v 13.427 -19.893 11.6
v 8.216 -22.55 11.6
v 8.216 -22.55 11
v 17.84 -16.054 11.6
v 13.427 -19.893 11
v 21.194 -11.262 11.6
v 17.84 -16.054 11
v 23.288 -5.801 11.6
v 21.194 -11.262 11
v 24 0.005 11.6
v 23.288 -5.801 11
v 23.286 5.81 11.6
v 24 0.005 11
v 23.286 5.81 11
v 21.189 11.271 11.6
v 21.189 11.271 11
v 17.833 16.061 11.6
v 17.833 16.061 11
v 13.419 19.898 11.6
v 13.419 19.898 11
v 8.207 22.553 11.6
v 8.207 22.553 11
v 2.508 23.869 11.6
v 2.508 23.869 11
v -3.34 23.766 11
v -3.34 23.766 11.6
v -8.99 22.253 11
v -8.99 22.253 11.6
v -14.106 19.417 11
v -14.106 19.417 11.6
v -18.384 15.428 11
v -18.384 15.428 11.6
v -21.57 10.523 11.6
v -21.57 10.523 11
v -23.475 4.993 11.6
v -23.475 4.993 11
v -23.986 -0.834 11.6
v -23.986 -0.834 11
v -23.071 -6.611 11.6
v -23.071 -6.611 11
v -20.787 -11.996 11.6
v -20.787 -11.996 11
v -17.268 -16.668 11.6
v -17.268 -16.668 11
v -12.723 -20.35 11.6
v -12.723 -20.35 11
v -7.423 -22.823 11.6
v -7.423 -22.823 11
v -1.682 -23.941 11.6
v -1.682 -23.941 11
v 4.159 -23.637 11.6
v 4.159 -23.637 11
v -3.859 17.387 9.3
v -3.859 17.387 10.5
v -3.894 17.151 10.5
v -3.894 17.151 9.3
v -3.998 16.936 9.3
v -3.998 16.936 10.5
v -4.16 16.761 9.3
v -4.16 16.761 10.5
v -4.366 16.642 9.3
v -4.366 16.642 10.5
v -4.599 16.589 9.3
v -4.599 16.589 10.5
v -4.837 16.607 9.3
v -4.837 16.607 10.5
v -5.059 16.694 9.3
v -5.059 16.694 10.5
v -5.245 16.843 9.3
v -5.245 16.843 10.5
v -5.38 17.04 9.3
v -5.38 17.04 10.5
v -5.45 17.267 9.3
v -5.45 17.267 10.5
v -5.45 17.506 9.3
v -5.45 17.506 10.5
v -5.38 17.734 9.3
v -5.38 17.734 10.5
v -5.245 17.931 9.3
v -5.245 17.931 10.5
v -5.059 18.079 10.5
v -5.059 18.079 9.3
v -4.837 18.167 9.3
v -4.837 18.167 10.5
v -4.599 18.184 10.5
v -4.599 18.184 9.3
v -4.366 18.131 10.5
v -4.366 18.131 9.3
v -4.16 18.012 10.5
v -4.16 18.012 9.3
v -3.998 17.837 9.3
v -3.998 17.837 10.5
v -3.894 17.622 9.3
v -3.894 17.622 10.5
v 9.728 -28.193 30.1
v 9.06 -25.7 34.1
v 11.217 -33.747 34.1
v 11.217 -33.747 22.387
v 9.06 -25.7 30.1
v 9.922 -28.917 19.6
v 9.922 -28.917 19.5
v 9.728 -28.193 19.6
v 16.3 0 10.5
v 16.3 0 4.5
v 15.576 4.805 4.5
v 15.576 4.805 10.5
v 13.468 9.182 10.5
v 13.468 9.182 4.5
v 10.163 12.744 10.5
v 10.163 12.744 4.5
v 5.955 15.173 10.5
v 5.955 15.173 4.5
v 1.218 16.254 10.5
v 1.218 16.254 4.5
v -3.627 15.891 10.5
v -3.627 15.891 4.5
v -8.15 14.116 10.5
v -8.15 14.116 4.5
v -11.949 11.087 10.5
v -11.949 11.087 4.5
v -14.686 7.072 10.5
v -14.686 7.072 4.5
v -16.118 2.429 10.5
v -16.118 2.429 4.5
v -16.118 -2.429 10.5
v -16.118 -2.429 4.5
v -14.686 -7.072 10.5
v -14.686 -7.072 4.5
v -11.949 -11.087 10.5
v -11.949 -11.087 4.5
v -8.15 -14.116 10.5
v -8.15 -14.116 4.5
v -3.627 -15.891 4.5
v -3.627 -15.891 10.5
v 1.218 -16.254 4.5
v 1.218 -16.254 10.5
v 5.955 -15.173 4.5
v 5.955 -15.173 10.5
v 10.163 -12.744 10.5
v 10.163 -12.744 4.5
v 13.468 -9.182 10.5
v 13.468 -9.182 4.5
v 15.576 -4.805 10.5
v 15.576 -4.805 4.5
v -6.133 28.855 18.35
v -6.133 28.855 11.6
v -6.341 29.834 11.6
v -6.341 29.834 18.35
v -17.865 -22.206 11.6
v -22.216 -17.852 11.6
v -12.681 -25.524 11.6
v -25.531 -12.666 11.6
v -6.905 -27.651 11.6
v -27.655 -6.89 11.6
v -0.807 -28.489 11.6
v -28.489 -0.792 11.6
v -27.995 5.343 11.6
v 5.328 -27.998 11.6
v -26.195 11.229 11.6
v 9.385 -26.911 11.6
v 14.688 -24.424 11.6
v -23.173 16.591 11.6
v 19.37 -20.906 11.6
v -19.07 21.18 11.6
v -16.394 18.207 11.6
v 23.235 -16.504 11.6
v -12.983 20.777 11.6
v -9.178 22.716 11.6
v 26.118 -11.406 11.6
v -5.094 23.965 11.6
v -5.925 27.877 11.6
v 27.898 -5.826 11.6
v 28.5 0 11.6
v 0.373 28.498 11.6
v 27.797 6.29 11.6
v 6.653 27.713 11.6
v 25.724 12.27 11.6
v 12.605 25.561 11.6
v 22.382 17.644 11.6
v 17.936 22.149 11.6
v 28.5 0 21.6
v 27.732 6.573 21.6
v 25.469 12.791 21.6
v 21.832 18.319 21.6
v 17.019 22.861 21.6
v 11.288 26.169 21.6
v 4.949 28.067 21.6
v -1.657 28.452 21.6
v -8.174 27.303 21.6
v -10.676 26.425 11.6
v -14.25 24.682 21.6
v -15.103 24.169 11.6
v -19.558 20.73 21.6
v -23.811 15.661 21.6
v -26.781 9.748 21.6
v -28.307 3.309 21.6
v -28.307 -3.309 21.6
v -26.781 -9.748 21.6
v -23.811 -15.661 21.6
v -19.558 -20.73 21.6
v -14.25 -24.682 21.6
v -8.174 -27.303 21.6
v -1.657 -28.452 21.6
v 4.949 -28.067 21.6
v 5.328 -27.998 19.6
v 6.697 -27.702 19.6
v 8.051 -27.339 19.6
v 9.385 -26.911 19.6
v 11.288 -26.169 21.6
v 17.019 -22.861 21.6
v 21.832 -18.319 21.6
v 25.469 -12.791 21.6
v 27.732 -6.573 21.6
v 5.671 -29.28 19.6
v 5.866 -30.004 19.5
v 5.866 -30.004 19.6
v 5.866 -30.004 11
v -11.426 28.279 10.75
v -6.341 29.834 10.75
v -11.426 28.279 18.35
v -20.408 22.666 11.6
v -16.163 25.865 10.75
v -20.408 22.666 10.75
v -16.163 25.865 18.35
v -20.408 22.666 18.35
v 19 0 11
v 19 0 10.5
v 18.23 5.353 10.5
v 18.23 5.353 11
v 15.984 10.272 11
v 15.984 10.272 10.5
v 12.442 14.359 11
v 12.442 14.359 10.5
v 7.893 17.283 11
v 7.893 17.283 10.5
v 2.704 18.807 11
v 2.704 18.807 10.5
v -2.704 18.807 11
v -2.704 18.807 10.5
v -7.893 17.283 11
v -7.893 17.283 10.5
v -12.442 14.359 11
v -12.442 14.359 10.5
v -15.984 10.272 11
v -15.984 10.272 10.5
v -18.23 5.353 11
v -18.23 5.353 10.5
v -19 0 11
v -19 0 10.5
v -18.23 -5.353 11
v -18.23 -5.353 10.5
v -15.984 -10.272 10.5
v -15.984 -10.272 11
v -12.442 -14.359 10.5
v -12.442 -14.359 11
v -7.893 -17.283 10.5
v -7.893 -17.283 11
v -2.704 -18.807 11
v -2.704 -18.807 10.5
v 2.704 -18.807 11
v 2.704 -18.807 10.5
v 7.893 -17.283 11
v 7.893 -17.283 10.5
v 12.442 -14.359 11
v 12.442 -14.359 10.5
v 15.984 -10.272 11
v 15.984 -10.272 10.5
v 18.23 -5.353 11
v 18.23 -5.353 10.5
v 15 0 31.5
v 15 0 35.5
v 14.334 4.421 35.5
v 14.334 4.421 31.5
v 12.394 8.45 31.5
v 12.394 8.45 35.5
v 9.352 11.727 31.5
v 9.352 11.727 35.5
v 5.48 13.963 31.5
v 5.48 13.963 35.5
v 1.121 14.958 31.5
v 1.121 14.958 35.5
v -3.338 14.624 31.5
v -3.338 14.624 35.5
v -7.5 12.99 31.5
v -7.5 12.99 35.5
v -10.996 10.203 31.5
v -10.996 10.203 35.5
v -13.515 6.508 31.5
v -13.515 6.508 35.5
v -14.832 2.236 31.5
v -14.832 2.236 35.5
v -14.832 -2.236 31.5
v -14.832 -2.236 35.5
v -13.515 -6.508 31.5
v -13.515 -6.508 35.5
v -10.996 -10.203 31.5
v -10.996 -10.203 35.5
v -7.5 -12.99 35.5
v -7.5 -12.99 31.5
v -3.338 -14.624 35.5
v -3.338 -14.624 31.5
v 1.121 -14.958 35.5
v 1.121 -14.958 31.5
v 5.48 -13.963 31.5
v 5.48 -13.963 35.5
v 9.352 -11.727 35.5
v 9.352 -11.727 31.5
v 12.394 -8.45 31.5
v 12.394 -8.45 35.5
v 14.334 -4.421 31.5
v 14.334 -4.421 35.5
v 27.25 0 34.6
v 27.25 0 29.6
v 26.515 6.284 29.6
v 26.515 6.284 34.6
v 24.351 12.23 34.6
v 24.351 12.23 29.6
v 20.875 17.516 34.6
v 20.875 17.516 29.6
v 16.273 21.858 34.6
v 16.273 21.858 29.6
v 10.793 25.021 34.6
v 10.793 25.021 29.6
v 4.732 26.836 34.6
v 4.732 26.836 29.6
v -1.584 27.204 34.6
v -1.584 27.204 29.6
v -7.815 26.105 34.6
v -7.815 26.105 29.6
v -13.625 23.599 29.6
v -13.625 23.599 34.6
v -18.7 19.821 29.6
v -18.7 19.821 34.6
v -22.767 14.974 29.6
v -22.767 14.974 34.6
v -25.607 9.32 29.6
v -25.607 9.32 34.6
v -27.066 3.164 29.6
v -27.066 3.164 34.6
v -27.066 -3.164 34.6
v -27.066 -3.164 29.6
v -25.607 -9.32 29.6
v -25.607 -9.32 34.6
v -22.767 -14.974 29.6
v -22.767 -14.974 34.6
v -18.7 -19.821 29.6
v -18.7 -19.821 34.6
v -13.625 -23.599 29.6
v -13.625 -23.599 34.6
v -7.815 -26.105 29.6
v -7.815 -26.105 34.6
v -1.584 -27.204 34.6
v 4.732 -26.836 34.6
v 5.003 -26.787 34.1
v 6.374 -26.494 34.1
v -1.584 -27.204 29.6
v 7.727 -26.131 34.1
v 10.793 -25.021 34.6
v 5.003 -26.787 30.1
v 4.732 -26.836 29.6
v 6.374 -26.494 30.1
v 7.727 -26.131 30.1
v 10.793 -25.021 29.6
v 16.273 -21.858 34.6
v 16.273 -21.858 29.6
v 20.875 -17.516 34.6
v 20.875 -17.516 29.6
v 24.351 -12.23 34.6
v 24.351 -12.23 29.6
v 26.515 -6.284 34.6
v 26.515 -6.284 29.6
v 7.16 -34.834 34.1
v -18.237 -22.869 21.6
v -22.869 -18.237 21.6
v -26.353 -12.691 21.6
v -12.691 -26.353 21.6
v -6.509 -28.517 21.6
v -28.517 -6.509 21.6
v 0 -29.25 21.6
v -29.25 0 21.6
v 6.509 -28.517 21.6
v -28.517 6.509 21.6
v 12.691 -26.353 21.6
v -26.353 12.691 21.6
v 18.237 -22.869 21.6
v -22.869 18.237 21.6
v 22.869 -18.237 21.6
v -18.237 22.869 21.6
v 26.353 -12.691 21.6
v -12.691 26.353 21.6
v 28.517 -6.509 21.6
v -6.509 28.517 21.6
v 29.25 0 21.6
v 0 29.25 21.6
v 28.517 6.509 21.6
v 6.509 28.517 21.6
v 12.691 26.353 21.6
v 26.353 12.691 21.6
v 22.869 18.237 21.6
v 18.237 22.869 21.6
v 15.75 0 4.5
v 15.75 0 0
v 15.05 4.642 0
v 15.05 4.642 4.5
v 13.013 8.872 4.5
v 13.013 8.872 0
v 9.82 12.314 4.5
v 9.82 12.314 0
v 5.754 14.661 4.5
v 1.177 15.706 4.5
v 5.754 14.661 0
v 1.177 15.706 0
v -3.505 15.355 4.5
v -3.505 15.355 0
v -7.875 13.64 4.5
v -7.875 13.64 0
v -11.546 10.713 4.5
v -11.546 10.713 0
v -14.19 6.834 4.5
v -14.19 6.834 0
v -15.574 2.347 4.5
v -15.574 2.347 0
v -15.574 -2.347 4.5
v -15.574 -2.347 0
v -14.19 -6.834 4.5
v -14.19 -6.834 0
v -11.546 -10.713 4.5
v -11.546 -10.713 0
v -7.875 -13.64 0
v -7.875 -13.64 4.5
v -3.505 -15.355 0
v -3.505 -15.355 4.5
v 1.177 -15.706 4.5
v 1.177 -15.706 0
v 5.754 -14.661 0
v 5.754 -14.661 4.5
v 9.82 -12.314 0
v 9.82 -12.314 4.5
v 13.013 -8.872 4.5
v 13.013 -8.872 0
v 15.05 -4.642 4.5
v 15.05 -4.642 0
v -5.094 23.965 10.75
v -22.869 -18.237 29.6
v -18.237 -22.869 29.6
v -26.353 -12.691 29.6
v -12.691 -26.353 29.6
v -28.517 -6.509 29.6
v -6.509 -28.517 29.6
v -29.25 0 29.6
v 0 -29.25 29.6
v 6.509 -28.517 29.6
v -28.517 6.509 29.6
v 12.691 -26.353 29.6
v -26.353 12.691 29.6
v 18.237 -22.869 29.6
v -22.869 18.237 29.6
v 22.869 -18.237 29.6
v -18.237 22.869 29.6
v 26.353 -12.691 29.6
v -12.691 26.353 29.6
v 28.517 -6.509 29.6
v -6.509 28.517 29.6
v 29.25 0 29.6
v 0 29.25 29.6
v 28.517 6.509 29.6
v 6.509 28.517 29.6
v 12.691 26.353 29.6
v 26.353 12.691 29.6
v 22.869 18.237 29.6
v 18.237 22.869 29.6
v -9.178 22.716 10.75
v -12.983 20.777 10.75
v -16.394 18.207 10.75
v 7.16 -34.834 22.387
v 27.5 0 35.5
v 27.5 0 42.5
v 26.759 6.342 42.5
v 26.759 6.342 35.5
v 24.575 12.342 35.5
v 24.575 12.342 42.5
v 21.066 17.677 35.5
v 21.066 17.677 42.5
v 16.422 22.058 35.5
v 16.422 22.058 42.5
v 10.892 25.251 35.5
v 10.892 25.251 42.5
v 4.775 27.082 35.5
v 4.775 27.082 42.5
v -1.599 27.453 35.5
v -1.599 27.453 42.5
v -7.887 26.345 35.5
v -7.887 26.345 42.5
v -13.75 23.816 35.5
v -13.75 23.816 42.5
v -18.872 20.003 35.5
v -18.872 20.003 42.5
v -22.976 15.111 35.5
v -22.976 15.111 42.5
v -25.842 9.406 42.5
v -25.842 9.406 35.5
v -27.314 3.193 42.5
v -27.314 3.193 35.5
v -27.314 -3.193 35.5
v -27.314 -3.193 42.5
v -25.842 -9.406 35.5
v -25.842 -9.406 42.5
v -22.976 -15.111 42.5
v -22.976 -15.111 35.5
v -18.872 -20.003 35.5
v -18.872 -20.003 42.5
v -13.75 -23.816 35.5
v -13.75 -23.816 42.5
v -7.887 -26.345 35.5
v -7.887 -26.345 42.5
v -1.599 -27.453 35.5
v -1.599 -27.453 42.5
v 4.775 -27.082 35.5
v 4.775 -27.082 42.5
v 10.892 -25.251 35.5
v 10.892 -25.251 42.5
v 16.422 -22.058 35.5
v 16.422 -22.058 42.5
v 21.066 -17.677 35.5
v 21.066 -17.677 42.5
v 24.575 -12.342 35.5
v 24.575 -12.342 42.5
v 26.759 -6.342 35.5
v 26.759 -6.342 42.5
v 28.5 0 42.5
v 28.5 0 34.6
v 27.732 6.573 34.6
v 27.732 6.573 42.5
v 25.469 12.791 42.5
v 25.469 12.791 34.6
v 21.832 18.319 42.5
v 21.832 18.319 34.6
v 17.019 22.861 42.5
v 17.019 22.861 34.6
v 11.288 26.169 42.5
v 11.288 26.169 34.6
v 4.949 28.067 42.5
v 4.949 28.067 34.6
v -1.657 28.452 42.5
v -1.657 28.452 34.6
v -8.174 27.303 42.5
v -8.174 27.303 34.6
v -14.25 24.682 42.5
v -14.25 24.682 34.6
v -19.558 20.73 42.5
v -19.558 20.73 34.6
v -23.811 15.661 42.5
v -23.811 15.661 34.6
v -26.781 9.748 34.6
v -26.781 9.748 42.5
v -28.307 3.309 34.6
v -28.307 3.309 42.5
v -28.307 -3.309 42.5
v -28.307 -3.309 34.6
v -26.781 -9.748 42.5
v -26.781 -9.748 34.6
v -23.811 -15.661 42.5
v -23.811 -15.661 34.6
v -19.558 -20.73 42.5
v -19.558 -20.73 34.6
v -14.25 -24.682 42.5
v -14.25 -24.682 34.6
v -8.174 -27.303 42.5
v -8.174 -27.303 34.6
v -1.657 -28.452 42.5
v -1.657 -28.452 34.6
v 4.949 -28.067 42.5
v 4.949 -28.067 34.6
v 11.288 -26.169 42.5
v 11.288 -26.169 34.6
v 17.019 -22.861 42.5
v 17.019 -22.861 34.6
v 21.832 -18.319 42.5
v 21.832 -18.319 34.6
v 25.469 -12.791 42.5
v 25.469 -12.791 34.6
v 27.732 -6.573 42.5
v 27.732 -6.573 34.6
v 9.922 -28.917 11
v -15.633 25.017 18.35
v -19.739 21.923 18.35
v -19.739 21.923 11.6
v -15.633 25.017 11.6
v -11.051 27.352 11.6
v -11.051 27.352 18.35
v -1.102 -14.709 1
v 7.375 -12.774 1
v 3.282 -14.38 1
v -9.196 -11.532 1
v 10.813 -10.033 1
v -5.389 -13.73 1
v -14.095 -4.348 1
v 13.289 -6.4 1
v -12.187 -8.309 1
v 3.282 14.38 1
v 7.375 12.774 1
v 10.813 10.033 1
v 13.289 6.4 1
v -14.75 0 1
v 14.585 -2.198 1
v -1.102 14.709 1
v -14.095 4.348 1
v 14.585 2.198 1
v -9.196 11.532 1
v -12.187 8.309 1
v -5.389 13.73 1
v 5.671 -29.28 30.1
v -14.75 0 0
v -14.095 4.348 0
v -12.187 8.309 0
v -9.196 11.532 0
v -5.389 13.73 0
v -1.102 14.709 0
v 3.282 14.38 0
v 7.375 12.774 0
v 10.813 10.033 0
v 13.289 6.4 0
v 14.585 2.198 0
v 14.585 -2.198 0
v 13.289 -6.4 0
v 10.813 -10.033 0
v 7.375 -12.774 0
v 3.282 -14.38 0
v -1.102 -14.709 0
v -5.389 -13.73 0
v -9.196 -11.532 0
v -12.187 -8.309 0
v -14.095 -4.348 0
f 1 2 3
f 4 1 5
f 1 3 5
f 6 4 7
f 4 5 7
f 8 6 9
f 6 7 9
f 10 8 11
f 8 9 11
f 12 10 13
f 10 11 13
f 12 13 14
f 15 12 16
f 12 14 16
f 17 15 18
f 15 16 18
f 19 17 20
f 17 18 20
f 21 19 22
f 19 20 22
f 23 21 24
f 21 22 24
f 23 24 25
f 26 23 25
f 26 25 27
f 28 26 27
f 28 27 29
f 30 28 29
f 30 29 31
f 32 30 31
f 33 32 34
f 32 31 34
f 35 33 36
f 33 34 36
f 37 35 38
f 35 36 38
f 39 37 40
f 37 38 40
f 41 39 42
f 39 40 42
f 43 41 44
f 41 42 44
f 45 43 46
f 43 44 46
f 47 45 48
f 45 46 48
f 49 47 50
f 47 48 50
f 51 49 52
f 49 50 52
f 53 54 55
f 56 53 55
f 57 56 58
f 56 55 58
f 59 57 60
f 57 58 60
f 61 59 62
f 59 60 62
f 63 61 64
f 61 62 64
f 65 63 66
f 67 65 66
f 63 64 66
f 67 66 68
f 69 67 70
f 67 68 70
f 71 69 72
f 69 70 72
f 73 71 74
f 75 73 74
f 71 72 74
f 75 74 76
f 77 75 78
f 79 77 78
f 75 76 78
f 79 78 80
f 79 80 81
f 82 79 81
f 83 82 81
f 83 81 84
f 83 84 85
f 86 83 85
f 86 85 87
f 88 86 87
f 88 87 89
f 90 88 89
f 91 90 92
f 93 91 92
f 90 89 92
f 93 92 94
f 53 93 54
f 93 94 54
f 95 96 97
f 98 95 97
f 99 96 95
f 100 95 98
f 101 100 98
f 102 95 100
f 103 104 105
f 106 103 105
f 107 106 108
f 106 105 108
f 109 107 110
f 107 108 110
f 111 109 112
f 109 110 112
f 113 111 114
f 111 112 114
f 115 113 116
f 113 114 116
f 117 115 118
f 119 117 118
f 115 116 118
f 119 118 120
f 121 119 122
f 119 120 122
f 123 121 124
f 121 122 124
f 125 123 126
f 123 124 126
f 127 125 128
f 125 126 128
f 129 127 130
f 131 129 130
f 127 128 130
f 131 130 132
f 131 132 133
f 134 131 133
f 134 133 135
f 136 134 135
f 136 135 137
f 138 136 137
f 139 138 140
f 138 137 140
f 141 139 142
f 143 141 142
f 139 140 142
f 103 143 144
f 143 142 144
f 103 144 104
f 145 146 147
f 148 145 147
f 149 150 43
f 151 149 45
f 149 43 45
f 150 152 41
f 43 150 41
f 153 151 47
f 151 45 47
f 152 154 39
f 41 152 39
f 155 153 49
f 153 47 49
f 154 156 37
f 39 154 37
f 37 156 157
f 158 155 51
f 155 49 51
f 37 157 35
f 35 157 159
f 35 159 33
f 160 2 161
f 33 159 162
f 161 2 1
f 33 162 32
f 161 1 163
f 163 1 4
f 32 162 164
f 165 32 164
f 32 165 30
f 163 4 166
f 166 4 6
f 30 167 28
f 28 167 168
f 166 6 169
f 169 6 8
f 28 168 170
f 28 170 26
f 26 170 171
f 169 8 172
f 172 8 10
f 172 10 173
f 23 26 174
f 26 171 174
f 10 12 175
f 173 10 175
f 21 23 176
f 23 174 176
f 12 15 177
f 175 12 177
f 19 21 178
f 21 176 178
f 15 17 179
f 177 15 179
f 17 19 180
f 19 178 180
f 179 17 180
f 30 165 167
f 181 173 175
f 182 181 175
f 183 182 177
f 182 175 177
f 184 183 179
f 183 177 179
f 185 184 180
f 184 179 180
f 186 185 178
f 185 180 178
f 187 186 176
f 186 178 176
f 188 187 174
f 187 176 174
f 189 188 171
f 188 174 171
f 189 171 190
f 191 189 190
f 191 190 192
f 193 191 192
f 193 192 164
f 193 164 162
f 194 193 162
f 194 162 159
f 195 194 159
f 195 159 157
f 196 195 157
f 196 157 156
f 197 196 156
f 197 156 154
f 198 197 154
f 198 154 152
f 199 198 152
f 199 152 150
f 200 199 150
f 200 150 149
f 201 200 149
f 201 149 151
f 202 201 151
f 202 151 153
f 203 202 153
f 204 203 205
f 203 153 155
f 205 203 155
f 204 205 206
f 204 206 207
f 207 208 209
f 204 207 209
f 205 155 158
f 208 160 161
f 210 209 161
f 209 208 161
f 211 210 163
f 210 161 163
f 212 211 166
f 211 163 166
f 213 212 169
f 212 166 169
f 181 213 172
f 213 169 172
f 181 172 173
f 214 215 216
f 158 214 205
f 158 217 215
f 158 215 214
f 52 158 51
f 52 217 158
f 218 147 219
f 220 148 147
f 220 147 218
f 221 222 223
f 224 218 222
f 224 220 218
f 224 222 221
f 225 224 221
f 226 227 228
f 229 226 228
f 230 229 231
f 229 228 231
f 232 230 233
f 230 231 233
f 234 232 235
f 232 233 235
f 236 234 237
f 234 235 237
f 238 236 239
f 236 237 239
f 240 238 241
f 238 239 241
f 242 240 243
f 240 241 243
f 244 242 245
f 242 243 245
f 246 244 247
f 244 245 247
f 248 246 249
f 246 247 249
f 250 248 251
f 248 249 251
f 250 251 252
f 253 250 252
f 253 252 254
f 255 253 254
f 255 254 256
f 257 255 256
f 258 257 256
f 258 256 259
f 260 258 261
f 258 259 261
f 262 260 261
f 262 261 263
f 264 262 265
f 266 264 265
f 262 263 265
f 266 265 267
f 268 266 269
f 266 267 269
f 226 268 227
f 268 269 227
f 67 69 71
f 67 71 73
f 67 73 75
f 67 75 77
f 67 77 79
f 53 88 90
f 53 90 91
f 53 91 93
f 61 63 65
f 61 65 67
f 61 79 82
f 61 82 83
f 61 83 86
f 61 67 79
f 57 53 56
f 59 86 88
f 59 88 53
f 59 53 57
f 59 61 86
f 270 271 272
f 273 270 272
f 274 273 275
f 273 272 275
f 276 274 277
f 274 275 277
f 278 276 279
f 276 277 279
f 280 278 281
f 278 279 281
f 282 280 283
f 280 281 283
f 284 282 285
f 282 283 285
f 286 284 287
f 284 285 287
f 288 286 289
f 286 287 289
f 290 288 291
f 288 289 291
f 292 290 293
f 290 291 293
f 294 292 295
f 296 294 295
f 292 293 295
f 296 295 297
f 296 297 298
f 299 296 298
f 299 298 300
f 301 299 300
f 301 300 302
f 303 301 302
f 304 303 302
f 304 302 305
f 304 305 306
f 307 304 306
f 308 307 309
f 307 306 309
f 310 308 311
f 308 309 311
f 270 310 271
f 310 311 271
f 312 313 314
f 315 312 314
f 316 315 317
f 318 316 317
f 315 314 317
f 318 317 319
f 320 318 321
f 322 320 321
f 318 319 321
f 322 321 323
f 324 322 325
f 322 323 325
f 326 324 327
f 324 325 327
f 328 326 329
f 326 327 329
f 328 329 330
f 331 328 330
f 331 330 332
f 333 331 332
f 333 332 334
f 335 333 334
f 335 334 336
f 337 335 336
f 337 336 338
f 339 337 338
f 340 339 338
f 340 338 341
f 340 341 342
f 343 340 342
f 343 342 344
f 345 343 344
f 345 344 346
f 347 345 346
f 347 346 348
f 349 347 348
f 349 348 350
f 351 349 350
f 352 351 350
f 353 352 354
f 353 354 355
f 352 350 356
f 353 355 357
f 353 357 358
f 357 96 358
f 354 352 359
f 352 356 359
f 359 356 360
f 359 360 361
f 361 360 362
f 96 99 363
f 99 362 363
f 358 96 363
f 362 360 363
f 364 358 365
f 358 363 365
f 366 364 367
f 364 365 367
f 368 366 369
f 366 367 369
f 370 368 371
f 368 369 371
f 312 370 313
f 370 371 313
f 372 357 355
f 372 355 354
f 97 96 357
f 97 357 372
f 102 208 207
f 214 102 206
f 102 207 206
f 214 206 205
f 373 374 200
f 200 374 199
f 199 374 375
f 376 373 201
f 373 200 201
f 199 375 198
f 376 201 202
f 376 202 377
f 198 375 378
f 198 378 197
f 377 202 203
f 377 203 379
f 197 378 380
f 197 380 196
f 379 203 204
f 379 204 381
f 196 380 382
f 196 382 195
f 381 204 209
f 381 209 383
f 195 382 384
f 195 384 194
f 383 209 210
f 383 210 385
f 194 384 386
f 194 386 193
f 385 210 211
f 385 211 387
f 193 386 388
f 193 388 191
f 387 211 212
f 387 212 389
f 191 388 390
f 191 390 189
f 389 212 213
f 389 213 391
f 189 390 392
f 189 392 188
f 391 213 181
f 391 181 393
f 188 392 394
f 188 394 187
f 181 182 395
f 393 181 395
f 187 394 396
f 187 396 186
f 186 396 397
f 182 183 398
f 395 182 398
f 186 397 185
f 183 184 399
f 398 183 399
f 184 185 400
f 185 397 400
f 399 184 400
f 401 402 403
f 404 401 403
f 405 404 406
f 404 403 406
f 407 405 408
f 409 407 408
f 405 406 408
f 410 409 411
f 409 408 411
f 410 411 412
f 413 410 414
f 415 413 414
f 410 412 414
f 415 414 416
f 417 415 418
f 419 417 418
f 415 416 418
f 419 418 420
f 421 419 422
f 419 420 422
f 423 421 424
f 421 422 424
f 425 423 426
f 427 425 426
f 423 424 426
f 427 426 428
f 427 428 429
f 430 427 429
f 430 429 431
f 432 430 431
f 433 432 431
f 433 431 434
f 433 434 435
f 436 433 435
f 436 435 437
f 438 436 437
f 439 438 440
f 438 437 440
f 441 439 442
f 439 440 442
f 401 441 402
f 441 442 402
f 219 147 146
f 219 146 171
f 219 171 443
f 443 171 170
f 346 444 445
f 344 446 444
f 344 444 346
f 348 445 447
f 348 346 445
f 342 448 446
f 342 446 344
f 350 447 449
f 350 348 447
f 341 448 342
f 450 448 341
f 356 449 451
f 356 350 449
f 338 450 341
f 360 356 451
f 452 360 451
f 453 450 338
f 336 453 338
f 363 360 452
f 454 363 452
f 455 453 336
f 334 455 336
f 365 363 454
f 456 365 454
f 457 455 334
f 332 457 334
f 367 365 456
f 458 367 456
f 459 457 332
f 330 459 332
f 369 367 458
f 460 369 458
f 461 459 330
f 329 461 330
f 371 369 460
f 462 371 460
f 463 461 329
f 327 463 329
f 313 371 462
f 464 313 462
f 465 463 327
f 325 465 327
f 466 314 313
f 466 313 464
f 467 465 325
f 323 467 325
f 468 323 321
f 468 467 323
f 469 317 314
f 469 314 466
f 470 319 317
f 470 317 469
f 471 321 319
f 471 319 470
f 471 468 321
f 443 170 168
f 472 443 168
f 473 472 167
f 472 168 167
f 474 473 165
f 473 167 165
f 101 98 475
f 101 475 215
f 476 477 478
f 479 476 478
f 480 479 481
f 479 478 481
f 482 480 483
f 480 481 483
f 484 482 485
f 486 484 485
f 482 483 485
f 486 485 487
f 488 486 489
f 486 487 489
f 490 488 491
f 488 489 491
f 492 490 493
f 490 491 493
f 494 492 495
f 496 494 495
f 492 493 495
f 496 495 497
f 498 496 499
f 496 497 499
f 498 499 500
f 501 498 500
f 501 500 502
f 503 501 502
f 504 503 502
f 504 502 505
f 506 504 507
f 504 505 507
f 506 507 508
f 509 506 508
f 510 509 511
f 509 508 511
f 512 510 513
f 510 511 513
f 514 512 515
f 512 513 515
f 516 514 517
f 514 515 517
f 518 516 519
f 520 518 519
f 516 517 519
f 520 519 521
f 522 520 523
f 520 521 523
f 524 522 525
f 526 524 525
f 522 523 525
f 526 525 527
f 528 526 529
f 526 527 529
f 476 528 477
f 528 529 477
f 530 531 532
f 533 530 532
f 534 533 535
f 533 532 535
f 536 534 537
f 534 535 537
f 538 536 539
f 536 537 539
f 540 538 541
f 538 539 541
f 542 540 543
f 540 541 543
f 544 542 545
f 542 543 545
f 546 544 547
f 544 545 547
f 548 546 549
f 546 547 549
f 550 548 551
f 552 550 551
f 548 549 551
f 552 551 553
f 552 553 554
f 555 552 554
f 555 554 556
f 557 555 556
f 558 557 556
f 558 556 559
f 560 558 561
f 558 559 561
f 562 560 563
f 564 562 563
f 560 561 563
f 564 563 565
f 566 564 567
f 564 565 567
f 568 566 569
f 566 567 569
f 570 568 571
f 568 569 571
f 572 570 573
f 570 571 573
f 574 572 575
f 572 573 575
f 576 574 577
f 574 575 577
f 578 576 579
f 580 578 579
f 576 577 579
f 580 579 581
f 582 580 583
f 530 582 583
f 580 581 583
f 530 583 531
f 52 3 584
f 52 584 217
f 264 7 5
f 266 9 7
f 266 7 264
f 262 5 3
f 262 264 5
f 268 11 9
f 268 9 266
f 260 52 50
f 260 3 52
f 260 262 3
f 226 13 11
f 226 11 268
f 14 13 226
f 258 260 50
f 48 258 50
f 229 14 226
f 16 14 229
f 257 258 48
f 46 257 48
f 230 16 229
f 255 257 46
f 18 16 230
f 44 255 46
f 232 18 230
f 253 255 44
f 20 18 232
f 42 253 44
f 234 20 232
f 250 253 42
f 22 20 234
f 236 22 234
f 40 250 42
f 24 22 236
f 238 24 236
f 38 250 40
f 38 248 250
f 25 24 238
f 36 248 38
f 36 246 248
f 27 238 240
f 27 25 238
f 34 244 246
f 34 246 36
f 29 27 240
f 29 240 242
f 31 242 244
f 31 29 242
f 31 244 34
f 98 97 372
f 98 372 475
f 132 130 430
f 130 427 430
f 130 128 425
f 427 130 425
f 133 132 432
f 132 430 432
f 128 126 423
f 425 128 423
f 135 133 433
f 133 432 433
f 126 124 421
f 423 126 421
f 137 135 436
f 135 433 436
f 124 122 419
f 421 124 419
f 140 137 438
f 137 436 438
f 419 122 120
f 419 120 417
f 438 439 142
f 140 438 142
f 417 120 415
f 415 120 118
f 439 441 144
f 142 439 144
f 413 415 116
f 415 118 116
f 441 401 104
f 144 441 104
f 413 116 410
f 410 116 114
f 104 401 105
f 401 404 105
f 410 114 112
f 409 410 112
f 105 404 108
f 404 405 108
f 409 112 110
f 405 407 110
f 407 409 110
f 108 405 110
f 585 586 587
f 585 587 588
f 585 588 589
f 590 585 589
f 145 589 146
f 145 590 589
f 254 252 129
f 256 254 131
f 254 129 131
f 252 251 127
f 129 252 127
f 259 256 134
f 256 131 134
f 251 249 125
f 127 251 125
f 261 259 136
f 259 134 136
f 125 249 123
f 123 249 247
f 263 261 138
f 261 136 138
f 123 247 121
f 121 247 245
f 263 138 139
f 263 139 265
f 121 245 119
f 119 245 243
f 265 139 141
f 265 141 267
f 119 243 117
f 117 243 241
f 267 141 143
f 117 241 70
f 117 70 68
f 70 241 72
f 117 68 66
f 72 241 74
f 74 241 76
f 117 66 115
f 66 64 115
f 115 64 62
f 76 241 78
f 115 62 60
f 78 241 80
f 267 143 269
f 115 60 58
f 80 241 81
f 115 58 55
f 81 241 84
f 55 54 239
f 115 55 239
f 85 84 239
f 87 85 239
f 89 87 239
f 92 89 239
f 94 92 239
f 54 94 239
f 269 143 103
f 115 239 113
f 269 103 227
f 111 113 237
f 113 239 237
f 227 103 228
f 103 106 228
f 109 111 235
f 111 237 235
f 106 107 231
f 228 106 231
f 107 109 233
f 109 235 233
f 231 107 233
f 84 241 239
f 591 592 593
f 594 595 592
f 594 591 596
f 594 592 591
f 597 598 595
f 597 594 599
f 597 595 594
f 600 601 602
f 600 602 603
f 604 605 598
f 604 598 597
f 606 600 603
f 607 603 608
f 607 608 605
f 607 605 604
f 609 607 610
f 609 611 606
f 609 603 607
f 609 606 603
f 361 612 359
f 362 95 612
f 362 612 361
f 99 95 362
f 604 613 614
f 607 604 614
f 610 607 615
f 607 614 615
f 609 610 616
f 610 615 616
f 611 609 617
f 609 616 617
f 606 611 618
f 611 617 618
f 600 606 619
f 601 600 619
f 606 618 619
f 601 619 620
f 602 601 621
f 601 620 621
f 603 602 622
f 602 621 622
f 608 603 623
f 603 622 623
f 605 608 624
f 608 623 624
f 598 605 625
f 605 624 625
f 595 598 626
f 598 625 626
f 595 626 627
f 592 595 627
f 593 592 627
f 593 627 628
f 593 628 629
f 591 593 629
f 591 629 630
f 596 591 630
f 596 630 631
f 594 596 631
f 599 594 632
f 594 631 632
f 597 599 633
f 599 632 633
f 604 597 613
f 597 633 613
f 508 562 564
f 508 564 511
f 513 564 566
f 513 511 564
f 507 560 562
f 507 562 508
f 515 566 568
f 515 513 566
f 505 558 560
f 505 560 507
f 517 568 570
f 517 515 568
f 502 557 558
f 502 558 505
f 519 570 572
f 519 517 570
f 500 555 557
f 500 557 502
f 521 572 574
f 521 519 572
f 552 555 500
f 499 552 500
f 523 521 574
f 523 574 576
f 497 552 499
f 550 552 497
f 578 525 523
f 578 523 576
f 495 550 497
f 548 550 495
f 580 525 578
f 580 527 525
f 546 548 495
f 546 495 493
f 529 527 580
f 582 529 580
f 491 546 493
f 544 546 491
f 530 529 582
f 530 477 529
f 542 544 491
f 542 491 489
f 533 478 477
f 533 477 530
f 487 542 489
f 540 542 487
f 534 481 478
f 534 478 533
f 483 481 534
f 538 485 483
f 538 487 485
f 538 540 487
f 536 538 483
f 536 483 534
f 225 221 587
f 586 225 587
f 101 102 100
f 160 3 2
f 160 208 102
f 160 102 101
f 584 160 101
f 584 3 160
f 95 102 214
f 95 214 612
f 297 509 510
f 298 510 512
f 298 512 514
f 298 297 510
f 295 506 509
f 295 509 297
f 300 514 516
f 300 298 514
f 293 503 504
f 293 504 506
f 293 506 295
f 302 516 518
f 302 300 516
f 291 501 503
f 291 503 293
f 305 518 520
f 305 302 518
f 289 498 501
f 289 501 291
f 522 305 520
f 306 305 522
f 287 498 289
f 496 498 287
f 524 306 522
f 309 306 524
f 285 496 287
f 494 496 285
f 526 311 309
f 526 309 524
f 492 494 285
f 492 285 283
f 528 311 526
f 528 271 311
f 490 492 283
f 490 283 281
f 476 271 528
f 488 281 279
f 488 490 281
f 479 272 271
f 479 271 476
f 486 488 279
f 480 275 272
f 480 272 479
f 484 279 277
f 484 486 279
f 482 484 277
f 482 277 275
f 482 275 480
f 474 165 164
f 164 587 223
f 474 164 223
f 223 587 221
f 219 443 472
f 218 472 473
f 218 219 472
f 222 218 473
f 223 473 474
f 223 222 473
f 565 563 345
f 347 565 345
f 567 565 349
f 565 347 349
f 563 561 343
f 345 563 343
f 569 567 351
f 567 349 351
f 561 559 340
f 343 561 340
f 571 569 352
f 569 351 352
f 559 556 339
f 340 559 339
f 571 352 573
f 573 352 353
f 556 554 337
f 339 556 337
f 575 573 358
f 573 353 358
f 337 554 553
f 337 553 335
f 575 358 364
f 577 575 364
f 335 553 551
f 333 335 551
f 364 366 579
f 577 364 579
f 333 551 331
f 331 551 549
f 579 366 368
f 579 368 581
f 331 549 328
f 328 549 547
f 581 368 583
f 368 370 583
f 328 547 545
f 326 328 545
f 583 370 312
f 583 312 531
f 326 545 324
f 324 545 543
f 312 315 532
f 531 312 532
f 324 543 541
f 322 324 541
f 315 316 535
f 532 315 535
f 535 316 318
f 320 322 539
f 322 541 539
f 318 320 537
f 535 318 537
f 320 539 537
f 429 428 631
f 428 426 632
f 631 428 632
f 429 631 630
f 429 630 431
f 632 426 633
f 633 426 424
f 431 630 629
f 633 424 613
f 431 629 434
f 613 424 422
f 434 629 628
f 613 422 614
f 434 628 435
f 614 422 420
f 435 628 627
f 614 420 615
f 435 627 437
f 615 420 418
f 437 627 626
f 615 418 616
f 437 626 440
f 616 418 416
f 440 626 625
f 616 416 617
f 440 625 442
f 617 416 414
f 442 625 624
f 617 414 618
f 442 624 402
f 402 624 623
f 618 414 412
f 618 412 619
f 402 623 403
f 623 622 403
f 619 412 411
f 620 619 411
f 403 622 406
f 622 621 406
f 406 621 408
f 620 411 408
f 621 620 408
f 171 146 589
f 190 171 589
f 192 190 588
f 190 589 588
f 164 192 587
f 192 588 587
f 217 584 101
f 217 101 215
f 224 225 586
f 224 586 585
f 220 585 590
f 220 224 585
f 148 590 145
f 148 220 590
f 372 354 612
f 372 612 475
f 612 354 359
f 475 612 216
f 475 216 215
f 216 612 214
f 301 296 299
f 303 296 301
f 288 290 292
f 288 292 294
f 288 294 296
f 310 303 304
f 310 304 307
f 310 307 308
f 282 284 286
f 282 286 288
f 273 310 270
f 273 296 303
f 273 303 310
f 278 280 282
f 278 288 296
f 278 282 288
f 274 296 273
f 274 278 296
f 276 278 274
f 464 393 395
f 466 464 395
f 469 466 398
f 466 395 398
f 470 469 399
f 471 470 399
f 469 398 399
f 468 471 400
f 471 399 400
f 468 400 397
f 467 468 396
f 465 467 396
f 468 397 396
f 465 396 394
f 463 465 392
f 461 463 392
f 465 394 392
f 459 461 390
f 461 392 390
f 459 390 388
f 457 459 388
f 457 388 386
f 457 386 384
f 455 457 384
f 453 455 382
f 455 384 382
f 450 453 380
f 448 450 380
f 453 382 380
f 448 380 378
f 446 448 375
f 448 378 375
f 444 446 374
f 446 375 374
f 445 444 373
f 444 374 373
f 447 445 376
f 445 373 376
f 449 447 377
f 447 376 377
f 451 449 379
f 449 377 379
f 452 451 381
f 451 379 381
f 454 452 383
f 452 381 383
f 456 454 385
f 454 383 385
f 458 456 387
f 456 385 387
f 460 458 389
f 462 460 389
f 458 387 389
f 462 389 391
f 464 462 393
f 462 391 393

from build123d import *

# Parameters (mm, degrees)
SKETCH_1_R          = 15.75
EXTRUDE_1_DEPTH     = 4.5
SKETCH_2_R          = 16.3
EXTRUDE_2_DEPTH     = 6
SKETCH_3_R          = 19
EXTRUDE_3_DEPTH     = 0.5
SKETCH_4_R          = 24
EXTRUDE_4_DEPTH     = 0.6
SKETCH_5_R          = 28.5
EXTRUDE_5_DEPTH     = 10
SKETCH_6_R          = 0.8
EXTRUDE_6_DEPTH     = 1.2
SKETCH_7_R          = 29.25
EXTRUDE_7_DEPTH     = 8
SKETCH_8_R          = 27.25
EXTRUDE_8_DEPTH     = 5
SKETCH_9_R          = 28.5
EXTRUDE_9_DEPTH     = 7.9
SKETCH_10_R         = 14.75
CUT_EXTRUDE_1_DEPTH = 1
SKETCH_11_R         = 27.5
CUT_EXTRUDE_2_DEPTH = 7
SKETCH_12_R         = 15
CUT_EXTRUDE_3_DEPTH = 4
EXTRUDE_10_DEPTH    = 0.85
EXTRUDE_START       = 6.75
EXTRUDE_11_DEPTH    = 6.75
EXTRUDE_12_DEPTH    = 8.6
EXTRUDE_16_DEPTH    = 4.2


with BuildPart() as part:
    # 草图1 → 凸台-拉伸1 (new body)
    with BuildSketch(Plane.XY):
        Circle(SKETCH_1_R)
    extrude(amount=EXTRUDE_1_DEPTH)

    # 草图2 → 凸台-拉伸2 (add)
    with BuildSketch(Plane.XY.offset(4.5)):
        Circle(SKETCH_2_R)
    extrude(amount=EXTRUDE_2_DEPTH)

    # 草图3 → 凸台-拉伸3 (add)
    with BuildSketch(Plane.XY.offset(10.5)):
        Circle(SKETCH_3_R)
    extrude(amount=EXTRUDE_3_DEPTH)

    # 草图4 → 凸台-拉伸4 (add)
    with BuildSketch(Plane.XY.offset(11)):
        Circle(SKETCH_4_R)
    extrude(amount=EXTRUDE_4_DEPTH)

    # 草图5 → 凸台-拉伸5 (add)
    with BuildSketch(Plane.XY.offset(11.6)):
        Circle(SKETCH_5_R)
    extrude(amount=EXTRUDE_5_DEPTH)

    # 草图6 → 凸台-拉伸6 (add)
    with BuildSketch(Plane(origin=(0, 0, 10.5), x_dir=(-1, 0, 0), z_dir=(0, 0, -1))):
        with Locations(Location((4.658742812, 17.386664873, 0), (0, 0, 180))):
            Circle(SKETCH_6_R)
    extrude(amount=EXTRUDE_6_DEPTH)

    # 草图7 → 凸台-拉伸7 (add)
    with BuildSketch(Plane.XY.offset(21.6)):
        Circle(SKETCH_7_R)
    extrude(amount=EXTRUDE_7_DEPTH)

    # 草图8 → 凸台-拉伸8 (add)
    with BuildSketch(Plane.XY.offset(29.6)):
        Circle(SKETCH_8_R)
    extrude(amount=EXTRUDE_8_DEPTH)

    # 草图9 → 凸台-拉伸9 (add)
    with BuildSketch(Plane.XY.offset(34.6)):
        Circle(SKETCH_9_R)
    extrude(amount=EXTRUDE_9_DEPTH)

    # 草图10 → 切除-拉伸1 (cut)
    with BuildSketch(Plane(origin=(0, 0, 0), x_dir=(-1, 0, 0), z_dir=(0, 0, -1))):
        Circle(SKETCH_10_R)
    extrude(amount=-CUT_EXTRUDE_1_DEPTH, mode=Mode.SUBTRACT)

    # 草图11 → 切除-拉伸2 (cut)
    with BuildSketch(Plane.XY.offset(42.5)):
        Circle(SKETCH_11_R)
    extrude(amount=-CUT_EXTRUDE_2_DEPTH, mode=Mode.SUBTRACT)

    # 草图12 → 切除-拉伸3 (cut)
    with BuildSketch(Plane.XY.offset(35.5)):
        Circle(SKETCH_12_R)
    extrude(amount=-CUT_EXTRUDE_3_DEPTH, mode=Mode.SUBTRACT)

    # 草图13 → 凸台-拉伸10 (add)
    with BuildSketch(Plane(origin=(0, 0, 11.6), x_dir=(-1, 0, 0), z_dir=(0, 0, -1))):
        with BuildLine():
            Line((6.34130657, 29.833501822), (5.093836425, 23.964616218))
            ThreePointArc((5.093836425, 23.964616218), (11.122767244, 21.829659843), (16.393699856, 18.207048224))
            Line((16.393699856, 18.207048224), (20.408483494, 22.665917177))
            ThreePointArc((20.408483494, 22.665917177), (13.846710242, 27.175698988), (6.34130657, 29.833501822))
        make_face()
    extrude(amount=EXTRUDE_10_DEPTH)

    # 草图14 → 凸台-拉伸11 (add)
    with BuildSketch(Plane.XY.offset(11.6).offset(EXTRUDE_START)):
        with BuildLine():
            Line((-20.408483494, 22.665917177), (-19.739352888, 21.922772352))
            ThreePointArc((-19.739352888, 21.922772352), (-13.392719742, 26.284692464), (-6.133394879, 28.855354222))
            Line((-6.133394879, 28.855354222), (-6.34130657, 29.833501822))
            ThreePointArc((-6.34130657, 29.833501822), (-13.846710242, 27.175698988), (-20.408483494, 22.665917177))
        make_face()
    extrude(amount=-EXTRUDE_11_DEPTH)

    # 草图15 → 凸台-拉伸12 (add)
    with BuildSketch(Plane(origin=(0, 0, 11), x_dir=(-1, 0, 0), z_dir=(0, 0, -1))):
        with BuildLine():
            Line((-8.216276628, -22.549784885), (-9.922425111, -28.917217707))
            Line((-9.922425111, -28.917217707), (-5.86553664, -30.004257697))
            Line((-5.86553664, -30.004257697), (-4.159388158, -23.636824875))
            ThreePointArc((-4.159388158, -23.636824875), (-6.211657082, -23.182219831), (-8.216276628, -22.549784885))
        make_face()
    extrude(amount=-EXTRUDE_12_DEPTH)

    # 草图16 → 凸台-拉伸16 (add)
    with BuildSketch(Plane(origin=(2.028444235, 0.543519995, 0), x_dir=(0, 0, -1), z_dir=(0.9659258262890674, 0.25881904510252446, 0))):
        Polygon((-34.1, -25.25), (-34.1, -35.5), (-22.386751346, -35.5), (-19.5, -30.5), (-19.5, -29.75), (-30.1, -29.75), (-30.1, -25.25), align=None)
    extrude(amount=-EXTRUDE_16_DEPTH)


solid = part.part
